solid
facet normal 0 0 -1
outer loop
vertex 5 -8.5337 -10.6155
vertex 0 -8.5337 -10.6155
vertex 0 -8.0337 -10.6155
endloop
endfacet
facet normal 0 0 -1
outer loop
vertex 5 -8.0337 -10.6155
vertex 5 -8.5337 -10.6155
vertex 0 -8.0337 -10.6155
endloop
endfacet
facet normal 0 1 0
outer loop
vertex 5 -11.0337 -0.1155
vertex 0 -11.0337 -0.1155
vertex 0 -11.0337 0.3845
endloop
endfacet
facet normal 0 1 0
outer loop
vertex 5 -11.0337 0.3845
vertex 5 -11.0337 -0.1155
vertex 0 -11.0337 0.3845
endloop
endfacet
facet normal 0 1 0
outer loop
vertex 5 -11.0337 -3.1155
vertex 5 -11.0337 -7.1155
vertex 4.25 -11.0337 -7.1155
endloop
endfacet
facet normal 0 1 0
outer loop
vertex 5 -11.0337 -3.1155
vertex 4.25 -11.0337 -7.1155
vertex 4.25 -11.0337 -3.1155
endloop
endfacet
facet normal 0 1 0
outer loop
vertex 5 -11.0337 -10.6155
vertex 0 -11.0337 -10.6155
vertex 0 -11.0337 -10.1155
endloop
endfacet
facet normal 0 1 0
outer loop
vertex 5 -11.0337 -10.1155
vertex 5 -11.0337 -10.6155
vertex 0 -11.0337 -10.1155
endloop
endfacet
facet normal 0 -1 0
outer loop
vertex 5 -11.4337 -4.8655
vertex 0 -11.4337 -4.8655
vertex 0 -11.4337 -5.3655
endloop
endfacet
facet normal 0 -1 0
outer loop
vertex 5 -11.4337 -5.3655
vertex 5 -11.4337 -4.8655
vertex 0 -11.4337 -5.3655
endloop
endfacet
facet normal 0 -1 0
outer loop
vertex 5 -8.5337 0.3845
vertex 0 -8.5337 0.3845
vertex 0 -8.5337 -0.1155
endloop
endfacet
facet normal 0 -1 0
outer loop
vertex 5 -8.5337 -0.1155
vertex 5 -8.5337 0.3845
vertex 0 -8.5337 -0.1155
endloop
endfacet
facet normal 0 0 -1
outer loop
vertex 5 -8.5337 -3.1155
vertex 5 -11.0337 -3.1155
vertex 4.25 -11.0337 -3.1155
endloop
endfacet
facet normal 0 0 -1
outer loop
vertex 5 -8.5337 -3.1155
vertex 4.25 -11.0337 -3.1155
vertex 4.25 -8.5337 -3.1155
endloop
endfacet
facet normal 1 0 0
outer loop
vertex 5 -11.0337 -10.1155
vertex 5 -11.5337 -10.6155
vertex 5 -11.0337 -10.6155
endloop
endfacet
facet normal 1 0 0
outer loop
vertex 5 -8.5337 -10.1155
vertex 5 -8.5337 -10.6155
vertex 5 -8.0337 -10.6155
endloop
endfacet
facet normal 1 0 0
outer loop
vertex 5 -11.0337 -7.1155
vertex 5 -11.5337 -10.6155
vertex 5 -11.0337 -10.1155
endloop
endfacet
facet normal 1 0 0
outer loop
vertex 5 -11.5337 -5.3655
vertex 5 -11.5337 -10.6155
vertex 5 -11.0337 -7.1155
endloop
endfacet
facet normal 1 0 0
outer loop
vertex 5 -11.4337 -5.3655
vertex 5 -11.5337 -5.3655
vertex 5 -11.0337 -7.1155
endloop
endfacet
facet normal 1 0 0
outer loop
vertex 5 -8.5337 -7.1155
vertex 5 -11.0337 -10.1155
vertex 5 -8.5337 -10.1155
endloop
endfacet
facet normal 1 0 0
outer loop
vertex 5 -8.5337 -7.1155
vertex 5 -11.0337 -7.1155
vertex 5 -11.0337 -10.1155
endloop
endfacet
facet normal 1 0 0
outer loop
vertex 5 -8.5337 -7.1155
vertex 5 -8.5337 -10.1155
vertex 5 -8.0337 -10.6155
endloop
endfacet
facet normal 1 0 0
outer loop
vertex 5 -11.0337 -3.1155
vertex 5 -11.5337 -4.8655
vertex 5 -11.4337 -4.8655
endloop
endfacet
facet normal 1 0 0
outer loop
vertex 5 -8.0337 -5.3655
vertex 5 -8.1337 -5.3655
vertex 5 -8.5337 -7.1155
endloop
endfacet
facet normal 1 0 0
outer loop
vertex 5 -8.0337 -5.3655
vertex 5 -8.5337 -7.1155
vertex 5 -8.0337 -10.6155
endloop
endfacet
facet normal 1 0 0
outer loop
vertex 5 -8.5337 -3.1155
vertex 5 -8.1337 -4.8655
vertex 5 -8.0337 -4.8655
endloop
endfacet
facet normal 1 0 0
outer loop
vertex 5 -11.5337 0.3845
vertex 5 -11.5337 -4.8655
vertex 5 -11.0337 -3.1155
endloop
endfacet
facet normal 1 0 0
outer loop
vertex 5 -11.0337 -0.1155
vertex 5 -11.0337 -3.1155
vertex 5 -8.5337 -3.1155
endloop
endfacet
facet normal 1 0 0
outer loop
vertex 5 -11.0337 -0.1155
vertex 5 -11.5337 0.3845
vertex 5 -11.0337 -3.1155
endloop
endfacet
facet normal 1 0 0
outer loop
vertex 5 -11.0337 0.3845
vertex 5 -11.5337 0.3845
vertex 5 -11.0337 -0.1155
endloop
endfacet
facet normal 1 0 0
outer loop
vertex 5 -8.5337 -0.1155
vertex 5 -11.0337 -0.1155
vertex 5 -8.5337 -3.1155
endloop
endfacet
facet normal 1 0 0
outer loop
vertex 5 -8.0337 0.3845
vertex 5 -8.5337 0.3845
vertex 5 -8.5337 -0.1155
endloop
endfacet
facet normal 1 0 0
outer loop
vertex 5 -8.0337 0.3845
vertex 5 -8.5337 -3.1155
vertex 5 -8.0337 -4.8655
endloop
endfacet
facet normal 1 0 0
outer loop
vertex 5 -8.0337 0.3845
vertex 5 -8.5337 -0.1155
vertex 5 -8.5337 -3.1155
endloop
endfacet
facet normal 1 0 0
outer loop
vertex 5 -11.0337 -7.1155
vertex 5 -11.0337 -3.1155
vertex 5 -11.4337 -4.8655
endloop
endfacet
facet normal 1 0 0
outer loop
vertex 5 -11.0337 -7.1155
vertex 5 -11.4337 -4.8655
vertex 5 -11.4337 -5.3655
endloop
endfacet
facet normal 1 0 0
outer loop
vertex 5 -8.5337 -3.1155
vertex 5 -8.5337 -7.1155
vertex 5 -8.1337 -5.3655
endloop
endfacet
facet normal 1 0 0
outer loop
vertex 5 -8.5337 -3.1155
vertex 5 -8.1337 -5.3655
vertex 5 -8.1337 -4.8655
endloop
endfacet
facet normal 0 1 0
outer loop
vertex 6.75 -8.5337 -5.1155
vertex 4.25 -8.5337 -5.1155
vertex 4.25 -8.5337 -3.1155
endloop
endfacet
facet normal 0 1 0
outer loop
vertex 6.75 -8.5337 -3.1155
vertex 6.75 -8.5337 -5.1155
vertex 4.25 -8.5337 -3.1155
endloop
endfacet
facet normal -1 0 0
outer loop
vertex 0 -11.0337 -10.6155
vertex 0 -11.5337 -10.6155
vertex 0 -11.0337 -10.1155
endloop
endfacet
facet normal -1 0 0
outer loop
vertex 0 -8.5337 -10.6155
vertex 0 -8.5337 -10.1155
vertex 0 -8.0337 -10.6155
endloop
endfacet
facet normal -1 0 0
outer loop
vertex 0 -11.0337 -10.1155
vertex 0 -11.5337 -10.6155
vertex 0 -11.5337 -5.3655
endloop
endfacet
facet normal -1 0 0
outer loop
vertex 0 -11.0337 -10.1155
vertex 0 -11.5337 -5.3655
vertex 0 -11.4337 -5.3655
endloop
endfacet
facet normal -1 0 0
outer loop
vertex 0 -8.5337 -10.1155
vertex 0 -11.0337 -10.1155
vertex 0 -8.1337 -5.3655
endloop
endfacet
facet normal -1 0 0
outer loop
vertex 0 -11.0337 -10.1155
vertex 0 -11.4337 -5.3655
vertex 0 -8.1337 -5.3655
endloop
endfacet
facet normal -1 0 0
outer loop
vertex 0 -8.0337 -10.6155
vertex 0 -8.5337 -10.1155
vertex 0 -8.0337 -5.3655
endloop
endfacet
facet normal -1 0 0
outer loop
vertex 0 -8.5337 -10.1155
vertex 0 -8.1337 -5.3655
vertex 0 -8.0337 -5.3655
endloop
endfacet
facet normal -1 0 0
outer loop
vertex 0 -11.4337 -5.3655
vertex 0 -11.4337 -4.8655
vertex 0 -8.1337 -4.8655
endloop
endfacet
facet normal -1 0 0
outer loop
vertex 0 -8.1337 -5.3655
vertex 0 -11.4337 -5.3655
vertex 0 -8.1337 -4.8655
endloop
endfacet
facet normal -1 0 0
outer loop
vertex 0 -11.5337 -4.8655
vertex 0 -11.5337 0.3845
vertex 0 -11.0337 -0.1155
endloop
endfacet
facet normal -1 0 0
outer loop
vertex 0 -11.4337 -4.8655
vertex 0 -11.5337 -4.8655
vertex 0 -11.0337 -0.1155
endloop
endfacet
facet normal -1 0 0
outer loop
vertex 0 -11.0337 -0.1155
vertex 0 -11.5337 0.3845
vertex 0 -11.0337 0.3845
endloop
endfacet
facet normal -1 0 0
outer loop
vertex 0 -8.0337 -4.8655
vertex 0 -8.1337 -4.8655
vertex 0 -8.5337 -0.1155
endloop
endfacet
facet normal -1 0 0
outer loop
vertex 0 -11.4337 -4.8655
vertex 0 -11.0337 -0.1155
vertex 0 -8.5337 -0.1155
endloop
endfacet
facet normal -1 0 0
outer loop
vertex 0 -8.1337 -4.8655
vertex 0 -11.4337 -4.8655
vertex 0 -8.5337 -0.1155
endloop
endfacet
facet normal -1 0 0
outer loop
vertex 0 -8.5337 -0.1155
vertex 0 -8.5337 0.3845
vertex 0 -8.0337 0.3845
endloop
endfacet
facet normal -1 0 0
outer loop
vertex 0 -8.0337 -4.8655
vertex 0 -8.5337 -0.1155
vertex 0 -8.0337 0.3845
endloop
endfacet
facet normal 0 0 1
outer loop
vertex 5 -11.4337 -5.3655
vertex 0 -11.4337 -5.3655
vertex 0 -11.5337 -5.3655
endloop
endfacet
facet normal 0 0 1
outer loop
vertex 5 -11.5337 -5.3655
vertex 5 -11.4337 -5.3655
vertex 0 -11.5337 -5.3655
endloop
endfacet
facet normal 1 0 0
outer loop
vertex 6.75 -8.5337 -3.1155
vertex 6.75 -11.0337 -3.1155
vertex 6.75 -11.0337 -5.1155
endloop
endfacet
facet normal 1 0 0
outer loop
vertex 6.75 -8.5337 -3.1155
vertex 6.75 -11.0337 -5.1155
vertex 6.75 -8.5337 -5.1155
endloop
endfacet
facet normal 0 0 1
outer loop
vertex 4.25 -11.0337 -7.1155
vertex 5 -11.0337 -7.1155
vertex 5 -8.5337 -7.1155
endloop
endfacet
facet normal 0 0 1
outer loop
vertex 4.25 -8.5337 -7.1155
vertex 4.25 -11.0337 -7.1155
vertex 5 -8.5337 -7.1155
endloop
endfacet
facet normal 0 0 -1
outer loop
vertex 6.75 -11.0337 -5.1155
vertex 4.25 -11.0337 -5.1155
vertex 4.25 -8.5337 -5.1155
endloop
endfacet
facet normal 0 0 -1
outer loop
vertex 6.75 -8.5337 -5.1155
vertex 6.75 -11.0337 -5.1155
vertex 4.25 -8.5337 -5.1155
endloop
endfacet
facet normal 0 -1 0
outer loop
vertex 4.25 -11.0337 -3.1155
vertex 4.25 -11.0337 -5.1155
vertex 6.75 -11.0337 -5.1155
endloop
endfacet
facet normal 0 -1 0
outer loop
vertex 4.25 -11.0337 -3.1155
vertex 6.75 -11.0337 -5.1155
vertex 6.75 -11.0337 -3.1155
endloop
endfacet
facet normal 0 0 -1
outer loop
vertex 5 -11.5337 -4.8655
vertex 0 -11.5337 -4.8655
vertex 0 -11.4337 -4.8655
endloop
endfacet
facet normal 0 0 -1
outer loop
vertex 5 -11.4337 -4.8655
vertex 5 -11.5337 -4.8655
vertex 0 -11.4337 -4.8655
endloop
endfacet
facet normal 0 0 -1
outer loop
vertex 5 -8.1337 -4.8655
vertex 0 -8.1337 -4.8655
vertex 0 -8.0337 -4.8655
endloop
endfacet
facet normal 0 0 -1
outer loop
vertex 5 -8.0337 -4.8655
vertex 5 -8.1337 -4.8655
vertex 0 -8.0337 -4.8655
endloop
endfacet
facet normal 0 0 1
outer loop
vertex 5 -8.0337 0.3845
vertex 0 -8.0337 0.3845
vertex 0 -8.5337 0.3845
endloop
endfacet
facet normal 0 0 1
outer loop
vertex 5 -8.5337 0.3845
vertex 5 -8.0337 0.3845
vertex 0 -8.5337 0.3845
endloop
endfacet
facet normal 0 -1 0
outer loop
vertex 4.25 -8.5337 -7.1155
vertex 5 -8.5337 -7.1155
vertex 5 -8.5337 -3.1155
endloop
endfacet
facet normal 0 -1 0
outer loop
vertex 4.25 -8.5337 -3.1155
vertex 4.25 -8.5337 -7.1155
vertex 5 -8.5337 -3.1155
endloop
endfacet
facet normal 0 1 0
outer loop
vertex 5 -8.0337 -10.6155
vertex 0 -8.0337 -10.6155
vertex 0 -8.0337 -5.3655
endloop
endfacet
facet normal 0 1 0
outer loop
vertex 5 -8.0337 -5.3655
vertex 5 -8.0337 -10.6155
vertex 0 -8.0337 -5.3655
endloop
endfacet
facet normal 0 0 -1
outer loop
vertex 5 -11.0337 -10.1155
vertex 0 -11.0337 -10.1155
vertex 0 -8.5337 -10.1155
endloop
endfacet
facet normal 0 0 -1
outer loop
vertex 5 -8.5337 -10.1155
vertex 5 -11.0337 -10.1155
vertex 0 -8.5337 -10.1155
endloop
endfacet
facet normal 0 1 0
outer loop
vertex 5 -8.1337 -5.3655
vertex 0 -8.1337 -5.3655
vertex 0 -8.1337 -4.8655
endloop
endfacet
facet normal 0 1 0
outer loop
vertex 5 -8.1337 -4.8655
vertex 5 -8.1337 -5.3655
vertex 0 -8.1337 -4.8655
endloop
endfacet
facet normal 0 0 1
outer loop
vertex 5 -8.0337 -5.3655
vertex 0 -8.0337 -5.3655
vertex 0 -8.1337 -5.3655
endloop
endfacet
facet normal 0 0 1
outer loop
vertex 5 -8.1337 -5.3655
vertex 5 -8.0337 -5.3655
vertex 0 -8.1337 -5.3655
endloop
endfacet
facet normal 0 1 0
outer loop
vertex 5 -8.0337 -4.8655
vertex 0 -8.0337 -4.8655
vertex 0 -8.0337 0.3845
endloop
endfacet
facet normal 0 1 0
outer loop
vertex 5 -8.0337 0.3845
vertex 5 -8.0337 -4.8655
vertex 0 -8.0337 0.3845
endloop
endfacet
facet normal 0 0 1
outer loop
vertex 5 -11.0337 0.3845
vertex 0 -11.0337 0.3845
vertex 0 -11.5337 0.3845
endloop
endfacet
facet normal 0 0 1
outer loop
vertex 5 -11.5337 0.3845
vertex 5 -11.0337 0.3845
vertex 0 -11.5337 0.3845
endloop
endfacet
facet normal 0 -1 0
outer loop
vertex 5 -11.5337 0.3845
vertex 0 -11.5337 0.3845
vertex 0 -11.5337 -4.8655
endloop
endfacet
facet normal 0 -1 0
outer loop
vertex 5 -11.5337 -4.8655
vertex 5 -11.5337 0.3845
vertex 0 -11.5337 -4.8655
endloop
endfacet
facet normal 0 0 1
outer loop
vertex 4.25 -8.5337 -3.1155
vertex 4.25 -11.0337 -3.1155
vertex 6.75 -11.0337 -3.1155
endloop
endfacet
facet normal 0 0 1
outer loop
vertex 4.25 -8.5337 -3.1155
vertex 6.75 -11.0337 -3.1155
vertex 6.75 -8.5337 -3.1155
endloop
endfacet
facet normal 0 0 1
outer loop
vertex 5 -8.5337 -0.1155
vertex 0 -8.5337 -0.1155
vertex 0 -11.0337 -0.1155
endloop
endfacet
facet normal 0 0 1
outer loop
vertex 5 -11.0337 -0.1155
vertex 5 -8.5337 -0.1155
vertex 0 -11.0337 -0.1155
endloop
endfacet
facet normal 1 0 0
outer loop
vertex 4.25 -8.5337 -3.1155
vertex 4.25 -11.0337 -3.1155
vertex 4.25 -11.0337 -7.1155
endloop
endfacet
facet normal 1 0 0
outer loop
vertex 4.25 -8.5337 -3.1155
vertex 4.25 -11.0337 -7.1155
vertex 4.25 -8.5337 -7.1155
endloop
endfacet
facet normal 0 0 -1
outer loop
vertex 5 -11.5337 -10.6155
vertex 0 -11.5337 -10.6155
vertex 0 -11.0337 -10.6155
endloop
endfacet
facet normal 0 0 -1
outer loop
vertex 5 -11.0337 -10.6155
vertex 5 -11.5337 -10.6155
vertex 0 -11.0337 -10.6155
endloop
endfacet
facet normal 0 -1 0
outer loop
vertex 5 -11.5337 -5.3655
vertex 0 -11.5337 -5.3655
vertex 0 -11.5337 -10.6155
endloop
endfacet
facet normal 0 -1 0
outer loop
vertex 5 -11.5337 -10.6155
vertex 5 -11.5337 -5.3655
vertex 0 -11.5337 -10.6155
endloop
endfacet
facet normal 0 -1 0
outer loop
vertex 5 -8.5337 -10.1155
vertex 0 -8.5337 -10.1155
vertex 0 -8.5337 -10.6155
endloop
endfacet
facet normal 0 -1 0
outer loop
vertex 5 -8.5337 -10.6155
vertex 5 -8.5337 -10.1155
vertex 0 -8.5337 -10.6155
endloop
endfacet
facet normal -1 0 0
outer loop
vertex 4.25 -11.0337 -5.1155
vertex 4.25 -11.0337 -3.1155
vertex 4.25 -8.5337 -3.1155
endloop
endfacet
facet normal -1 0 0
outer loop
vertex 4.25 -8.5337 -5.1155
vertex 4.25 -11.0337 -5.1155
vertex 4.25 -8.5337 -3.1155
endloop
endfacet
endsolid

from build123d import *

# Parameters (mm, degrees)
F1_DEPTH = 5
F2_W     = 2.5
F2_H     = 4
F3_DEPTH = 0.75
F4_W     = 2.5
F4_H     = 2
F5_DEPTH = 2.5


with BuildPart() as f1:
    # F0 (on Right) → F1 (new body)
    with BuildSketch(Plane.YZ):
        Polygon((-11.0337002873, 0.3844816282), (-11.5337002873, 0.3844816282), (-11.5337002873, -4.8655183718), (-11.4337002873, -4.8655183718), (-11.4337002873, -5.3655183718), (-11.5337002873, -5.3655183718), (-11.5337002873, -10.6155183718), (-11.0337002873, -10.6155183718), (-11.0337002873, -10.1155183718), (-8.5337002873, -10.1155183718), (-8.5337002873, -10.6155183718), (-8.0337002873, -10.6155183718), (-8.0337002873, -5.3655183718), (-8.1337002873, -5.3655183718), (-8.1337002873, -4.8655183718), (-8.0337002873, -4.8655183718), (-8.0337002873, 0.3844816282), (-8.5337002873, 0.3844816282), (-8.5337002873, -0.1155183718), (-11.0337002873, -0.1155183718), align=None)
    extrude(amount=F1_DEPTH)

    # F2 (on face) → F3 (cut)
    with BuildSketch(Plane.YZ.offset(5)):
        with Locations((-9.7837002873, -5.1155183718)):
            Rectangle(F2_W, F2_H)
    extrude(amount=-F3_DEPTH, mode=Mode.SUBTRACT)


with BuildPart() as f5:
    # F4 (on face) → F5 (new body)
    with BuildSketch(Plane.YZ.offset(4.25)):
        with Locations((-9.7837002873, -4.1155183718)):
            Rectangle(F4_W, F4_H)
    extrude(amount=F5_DEPTH)


solid = Compound([f1.part, f5.part])
